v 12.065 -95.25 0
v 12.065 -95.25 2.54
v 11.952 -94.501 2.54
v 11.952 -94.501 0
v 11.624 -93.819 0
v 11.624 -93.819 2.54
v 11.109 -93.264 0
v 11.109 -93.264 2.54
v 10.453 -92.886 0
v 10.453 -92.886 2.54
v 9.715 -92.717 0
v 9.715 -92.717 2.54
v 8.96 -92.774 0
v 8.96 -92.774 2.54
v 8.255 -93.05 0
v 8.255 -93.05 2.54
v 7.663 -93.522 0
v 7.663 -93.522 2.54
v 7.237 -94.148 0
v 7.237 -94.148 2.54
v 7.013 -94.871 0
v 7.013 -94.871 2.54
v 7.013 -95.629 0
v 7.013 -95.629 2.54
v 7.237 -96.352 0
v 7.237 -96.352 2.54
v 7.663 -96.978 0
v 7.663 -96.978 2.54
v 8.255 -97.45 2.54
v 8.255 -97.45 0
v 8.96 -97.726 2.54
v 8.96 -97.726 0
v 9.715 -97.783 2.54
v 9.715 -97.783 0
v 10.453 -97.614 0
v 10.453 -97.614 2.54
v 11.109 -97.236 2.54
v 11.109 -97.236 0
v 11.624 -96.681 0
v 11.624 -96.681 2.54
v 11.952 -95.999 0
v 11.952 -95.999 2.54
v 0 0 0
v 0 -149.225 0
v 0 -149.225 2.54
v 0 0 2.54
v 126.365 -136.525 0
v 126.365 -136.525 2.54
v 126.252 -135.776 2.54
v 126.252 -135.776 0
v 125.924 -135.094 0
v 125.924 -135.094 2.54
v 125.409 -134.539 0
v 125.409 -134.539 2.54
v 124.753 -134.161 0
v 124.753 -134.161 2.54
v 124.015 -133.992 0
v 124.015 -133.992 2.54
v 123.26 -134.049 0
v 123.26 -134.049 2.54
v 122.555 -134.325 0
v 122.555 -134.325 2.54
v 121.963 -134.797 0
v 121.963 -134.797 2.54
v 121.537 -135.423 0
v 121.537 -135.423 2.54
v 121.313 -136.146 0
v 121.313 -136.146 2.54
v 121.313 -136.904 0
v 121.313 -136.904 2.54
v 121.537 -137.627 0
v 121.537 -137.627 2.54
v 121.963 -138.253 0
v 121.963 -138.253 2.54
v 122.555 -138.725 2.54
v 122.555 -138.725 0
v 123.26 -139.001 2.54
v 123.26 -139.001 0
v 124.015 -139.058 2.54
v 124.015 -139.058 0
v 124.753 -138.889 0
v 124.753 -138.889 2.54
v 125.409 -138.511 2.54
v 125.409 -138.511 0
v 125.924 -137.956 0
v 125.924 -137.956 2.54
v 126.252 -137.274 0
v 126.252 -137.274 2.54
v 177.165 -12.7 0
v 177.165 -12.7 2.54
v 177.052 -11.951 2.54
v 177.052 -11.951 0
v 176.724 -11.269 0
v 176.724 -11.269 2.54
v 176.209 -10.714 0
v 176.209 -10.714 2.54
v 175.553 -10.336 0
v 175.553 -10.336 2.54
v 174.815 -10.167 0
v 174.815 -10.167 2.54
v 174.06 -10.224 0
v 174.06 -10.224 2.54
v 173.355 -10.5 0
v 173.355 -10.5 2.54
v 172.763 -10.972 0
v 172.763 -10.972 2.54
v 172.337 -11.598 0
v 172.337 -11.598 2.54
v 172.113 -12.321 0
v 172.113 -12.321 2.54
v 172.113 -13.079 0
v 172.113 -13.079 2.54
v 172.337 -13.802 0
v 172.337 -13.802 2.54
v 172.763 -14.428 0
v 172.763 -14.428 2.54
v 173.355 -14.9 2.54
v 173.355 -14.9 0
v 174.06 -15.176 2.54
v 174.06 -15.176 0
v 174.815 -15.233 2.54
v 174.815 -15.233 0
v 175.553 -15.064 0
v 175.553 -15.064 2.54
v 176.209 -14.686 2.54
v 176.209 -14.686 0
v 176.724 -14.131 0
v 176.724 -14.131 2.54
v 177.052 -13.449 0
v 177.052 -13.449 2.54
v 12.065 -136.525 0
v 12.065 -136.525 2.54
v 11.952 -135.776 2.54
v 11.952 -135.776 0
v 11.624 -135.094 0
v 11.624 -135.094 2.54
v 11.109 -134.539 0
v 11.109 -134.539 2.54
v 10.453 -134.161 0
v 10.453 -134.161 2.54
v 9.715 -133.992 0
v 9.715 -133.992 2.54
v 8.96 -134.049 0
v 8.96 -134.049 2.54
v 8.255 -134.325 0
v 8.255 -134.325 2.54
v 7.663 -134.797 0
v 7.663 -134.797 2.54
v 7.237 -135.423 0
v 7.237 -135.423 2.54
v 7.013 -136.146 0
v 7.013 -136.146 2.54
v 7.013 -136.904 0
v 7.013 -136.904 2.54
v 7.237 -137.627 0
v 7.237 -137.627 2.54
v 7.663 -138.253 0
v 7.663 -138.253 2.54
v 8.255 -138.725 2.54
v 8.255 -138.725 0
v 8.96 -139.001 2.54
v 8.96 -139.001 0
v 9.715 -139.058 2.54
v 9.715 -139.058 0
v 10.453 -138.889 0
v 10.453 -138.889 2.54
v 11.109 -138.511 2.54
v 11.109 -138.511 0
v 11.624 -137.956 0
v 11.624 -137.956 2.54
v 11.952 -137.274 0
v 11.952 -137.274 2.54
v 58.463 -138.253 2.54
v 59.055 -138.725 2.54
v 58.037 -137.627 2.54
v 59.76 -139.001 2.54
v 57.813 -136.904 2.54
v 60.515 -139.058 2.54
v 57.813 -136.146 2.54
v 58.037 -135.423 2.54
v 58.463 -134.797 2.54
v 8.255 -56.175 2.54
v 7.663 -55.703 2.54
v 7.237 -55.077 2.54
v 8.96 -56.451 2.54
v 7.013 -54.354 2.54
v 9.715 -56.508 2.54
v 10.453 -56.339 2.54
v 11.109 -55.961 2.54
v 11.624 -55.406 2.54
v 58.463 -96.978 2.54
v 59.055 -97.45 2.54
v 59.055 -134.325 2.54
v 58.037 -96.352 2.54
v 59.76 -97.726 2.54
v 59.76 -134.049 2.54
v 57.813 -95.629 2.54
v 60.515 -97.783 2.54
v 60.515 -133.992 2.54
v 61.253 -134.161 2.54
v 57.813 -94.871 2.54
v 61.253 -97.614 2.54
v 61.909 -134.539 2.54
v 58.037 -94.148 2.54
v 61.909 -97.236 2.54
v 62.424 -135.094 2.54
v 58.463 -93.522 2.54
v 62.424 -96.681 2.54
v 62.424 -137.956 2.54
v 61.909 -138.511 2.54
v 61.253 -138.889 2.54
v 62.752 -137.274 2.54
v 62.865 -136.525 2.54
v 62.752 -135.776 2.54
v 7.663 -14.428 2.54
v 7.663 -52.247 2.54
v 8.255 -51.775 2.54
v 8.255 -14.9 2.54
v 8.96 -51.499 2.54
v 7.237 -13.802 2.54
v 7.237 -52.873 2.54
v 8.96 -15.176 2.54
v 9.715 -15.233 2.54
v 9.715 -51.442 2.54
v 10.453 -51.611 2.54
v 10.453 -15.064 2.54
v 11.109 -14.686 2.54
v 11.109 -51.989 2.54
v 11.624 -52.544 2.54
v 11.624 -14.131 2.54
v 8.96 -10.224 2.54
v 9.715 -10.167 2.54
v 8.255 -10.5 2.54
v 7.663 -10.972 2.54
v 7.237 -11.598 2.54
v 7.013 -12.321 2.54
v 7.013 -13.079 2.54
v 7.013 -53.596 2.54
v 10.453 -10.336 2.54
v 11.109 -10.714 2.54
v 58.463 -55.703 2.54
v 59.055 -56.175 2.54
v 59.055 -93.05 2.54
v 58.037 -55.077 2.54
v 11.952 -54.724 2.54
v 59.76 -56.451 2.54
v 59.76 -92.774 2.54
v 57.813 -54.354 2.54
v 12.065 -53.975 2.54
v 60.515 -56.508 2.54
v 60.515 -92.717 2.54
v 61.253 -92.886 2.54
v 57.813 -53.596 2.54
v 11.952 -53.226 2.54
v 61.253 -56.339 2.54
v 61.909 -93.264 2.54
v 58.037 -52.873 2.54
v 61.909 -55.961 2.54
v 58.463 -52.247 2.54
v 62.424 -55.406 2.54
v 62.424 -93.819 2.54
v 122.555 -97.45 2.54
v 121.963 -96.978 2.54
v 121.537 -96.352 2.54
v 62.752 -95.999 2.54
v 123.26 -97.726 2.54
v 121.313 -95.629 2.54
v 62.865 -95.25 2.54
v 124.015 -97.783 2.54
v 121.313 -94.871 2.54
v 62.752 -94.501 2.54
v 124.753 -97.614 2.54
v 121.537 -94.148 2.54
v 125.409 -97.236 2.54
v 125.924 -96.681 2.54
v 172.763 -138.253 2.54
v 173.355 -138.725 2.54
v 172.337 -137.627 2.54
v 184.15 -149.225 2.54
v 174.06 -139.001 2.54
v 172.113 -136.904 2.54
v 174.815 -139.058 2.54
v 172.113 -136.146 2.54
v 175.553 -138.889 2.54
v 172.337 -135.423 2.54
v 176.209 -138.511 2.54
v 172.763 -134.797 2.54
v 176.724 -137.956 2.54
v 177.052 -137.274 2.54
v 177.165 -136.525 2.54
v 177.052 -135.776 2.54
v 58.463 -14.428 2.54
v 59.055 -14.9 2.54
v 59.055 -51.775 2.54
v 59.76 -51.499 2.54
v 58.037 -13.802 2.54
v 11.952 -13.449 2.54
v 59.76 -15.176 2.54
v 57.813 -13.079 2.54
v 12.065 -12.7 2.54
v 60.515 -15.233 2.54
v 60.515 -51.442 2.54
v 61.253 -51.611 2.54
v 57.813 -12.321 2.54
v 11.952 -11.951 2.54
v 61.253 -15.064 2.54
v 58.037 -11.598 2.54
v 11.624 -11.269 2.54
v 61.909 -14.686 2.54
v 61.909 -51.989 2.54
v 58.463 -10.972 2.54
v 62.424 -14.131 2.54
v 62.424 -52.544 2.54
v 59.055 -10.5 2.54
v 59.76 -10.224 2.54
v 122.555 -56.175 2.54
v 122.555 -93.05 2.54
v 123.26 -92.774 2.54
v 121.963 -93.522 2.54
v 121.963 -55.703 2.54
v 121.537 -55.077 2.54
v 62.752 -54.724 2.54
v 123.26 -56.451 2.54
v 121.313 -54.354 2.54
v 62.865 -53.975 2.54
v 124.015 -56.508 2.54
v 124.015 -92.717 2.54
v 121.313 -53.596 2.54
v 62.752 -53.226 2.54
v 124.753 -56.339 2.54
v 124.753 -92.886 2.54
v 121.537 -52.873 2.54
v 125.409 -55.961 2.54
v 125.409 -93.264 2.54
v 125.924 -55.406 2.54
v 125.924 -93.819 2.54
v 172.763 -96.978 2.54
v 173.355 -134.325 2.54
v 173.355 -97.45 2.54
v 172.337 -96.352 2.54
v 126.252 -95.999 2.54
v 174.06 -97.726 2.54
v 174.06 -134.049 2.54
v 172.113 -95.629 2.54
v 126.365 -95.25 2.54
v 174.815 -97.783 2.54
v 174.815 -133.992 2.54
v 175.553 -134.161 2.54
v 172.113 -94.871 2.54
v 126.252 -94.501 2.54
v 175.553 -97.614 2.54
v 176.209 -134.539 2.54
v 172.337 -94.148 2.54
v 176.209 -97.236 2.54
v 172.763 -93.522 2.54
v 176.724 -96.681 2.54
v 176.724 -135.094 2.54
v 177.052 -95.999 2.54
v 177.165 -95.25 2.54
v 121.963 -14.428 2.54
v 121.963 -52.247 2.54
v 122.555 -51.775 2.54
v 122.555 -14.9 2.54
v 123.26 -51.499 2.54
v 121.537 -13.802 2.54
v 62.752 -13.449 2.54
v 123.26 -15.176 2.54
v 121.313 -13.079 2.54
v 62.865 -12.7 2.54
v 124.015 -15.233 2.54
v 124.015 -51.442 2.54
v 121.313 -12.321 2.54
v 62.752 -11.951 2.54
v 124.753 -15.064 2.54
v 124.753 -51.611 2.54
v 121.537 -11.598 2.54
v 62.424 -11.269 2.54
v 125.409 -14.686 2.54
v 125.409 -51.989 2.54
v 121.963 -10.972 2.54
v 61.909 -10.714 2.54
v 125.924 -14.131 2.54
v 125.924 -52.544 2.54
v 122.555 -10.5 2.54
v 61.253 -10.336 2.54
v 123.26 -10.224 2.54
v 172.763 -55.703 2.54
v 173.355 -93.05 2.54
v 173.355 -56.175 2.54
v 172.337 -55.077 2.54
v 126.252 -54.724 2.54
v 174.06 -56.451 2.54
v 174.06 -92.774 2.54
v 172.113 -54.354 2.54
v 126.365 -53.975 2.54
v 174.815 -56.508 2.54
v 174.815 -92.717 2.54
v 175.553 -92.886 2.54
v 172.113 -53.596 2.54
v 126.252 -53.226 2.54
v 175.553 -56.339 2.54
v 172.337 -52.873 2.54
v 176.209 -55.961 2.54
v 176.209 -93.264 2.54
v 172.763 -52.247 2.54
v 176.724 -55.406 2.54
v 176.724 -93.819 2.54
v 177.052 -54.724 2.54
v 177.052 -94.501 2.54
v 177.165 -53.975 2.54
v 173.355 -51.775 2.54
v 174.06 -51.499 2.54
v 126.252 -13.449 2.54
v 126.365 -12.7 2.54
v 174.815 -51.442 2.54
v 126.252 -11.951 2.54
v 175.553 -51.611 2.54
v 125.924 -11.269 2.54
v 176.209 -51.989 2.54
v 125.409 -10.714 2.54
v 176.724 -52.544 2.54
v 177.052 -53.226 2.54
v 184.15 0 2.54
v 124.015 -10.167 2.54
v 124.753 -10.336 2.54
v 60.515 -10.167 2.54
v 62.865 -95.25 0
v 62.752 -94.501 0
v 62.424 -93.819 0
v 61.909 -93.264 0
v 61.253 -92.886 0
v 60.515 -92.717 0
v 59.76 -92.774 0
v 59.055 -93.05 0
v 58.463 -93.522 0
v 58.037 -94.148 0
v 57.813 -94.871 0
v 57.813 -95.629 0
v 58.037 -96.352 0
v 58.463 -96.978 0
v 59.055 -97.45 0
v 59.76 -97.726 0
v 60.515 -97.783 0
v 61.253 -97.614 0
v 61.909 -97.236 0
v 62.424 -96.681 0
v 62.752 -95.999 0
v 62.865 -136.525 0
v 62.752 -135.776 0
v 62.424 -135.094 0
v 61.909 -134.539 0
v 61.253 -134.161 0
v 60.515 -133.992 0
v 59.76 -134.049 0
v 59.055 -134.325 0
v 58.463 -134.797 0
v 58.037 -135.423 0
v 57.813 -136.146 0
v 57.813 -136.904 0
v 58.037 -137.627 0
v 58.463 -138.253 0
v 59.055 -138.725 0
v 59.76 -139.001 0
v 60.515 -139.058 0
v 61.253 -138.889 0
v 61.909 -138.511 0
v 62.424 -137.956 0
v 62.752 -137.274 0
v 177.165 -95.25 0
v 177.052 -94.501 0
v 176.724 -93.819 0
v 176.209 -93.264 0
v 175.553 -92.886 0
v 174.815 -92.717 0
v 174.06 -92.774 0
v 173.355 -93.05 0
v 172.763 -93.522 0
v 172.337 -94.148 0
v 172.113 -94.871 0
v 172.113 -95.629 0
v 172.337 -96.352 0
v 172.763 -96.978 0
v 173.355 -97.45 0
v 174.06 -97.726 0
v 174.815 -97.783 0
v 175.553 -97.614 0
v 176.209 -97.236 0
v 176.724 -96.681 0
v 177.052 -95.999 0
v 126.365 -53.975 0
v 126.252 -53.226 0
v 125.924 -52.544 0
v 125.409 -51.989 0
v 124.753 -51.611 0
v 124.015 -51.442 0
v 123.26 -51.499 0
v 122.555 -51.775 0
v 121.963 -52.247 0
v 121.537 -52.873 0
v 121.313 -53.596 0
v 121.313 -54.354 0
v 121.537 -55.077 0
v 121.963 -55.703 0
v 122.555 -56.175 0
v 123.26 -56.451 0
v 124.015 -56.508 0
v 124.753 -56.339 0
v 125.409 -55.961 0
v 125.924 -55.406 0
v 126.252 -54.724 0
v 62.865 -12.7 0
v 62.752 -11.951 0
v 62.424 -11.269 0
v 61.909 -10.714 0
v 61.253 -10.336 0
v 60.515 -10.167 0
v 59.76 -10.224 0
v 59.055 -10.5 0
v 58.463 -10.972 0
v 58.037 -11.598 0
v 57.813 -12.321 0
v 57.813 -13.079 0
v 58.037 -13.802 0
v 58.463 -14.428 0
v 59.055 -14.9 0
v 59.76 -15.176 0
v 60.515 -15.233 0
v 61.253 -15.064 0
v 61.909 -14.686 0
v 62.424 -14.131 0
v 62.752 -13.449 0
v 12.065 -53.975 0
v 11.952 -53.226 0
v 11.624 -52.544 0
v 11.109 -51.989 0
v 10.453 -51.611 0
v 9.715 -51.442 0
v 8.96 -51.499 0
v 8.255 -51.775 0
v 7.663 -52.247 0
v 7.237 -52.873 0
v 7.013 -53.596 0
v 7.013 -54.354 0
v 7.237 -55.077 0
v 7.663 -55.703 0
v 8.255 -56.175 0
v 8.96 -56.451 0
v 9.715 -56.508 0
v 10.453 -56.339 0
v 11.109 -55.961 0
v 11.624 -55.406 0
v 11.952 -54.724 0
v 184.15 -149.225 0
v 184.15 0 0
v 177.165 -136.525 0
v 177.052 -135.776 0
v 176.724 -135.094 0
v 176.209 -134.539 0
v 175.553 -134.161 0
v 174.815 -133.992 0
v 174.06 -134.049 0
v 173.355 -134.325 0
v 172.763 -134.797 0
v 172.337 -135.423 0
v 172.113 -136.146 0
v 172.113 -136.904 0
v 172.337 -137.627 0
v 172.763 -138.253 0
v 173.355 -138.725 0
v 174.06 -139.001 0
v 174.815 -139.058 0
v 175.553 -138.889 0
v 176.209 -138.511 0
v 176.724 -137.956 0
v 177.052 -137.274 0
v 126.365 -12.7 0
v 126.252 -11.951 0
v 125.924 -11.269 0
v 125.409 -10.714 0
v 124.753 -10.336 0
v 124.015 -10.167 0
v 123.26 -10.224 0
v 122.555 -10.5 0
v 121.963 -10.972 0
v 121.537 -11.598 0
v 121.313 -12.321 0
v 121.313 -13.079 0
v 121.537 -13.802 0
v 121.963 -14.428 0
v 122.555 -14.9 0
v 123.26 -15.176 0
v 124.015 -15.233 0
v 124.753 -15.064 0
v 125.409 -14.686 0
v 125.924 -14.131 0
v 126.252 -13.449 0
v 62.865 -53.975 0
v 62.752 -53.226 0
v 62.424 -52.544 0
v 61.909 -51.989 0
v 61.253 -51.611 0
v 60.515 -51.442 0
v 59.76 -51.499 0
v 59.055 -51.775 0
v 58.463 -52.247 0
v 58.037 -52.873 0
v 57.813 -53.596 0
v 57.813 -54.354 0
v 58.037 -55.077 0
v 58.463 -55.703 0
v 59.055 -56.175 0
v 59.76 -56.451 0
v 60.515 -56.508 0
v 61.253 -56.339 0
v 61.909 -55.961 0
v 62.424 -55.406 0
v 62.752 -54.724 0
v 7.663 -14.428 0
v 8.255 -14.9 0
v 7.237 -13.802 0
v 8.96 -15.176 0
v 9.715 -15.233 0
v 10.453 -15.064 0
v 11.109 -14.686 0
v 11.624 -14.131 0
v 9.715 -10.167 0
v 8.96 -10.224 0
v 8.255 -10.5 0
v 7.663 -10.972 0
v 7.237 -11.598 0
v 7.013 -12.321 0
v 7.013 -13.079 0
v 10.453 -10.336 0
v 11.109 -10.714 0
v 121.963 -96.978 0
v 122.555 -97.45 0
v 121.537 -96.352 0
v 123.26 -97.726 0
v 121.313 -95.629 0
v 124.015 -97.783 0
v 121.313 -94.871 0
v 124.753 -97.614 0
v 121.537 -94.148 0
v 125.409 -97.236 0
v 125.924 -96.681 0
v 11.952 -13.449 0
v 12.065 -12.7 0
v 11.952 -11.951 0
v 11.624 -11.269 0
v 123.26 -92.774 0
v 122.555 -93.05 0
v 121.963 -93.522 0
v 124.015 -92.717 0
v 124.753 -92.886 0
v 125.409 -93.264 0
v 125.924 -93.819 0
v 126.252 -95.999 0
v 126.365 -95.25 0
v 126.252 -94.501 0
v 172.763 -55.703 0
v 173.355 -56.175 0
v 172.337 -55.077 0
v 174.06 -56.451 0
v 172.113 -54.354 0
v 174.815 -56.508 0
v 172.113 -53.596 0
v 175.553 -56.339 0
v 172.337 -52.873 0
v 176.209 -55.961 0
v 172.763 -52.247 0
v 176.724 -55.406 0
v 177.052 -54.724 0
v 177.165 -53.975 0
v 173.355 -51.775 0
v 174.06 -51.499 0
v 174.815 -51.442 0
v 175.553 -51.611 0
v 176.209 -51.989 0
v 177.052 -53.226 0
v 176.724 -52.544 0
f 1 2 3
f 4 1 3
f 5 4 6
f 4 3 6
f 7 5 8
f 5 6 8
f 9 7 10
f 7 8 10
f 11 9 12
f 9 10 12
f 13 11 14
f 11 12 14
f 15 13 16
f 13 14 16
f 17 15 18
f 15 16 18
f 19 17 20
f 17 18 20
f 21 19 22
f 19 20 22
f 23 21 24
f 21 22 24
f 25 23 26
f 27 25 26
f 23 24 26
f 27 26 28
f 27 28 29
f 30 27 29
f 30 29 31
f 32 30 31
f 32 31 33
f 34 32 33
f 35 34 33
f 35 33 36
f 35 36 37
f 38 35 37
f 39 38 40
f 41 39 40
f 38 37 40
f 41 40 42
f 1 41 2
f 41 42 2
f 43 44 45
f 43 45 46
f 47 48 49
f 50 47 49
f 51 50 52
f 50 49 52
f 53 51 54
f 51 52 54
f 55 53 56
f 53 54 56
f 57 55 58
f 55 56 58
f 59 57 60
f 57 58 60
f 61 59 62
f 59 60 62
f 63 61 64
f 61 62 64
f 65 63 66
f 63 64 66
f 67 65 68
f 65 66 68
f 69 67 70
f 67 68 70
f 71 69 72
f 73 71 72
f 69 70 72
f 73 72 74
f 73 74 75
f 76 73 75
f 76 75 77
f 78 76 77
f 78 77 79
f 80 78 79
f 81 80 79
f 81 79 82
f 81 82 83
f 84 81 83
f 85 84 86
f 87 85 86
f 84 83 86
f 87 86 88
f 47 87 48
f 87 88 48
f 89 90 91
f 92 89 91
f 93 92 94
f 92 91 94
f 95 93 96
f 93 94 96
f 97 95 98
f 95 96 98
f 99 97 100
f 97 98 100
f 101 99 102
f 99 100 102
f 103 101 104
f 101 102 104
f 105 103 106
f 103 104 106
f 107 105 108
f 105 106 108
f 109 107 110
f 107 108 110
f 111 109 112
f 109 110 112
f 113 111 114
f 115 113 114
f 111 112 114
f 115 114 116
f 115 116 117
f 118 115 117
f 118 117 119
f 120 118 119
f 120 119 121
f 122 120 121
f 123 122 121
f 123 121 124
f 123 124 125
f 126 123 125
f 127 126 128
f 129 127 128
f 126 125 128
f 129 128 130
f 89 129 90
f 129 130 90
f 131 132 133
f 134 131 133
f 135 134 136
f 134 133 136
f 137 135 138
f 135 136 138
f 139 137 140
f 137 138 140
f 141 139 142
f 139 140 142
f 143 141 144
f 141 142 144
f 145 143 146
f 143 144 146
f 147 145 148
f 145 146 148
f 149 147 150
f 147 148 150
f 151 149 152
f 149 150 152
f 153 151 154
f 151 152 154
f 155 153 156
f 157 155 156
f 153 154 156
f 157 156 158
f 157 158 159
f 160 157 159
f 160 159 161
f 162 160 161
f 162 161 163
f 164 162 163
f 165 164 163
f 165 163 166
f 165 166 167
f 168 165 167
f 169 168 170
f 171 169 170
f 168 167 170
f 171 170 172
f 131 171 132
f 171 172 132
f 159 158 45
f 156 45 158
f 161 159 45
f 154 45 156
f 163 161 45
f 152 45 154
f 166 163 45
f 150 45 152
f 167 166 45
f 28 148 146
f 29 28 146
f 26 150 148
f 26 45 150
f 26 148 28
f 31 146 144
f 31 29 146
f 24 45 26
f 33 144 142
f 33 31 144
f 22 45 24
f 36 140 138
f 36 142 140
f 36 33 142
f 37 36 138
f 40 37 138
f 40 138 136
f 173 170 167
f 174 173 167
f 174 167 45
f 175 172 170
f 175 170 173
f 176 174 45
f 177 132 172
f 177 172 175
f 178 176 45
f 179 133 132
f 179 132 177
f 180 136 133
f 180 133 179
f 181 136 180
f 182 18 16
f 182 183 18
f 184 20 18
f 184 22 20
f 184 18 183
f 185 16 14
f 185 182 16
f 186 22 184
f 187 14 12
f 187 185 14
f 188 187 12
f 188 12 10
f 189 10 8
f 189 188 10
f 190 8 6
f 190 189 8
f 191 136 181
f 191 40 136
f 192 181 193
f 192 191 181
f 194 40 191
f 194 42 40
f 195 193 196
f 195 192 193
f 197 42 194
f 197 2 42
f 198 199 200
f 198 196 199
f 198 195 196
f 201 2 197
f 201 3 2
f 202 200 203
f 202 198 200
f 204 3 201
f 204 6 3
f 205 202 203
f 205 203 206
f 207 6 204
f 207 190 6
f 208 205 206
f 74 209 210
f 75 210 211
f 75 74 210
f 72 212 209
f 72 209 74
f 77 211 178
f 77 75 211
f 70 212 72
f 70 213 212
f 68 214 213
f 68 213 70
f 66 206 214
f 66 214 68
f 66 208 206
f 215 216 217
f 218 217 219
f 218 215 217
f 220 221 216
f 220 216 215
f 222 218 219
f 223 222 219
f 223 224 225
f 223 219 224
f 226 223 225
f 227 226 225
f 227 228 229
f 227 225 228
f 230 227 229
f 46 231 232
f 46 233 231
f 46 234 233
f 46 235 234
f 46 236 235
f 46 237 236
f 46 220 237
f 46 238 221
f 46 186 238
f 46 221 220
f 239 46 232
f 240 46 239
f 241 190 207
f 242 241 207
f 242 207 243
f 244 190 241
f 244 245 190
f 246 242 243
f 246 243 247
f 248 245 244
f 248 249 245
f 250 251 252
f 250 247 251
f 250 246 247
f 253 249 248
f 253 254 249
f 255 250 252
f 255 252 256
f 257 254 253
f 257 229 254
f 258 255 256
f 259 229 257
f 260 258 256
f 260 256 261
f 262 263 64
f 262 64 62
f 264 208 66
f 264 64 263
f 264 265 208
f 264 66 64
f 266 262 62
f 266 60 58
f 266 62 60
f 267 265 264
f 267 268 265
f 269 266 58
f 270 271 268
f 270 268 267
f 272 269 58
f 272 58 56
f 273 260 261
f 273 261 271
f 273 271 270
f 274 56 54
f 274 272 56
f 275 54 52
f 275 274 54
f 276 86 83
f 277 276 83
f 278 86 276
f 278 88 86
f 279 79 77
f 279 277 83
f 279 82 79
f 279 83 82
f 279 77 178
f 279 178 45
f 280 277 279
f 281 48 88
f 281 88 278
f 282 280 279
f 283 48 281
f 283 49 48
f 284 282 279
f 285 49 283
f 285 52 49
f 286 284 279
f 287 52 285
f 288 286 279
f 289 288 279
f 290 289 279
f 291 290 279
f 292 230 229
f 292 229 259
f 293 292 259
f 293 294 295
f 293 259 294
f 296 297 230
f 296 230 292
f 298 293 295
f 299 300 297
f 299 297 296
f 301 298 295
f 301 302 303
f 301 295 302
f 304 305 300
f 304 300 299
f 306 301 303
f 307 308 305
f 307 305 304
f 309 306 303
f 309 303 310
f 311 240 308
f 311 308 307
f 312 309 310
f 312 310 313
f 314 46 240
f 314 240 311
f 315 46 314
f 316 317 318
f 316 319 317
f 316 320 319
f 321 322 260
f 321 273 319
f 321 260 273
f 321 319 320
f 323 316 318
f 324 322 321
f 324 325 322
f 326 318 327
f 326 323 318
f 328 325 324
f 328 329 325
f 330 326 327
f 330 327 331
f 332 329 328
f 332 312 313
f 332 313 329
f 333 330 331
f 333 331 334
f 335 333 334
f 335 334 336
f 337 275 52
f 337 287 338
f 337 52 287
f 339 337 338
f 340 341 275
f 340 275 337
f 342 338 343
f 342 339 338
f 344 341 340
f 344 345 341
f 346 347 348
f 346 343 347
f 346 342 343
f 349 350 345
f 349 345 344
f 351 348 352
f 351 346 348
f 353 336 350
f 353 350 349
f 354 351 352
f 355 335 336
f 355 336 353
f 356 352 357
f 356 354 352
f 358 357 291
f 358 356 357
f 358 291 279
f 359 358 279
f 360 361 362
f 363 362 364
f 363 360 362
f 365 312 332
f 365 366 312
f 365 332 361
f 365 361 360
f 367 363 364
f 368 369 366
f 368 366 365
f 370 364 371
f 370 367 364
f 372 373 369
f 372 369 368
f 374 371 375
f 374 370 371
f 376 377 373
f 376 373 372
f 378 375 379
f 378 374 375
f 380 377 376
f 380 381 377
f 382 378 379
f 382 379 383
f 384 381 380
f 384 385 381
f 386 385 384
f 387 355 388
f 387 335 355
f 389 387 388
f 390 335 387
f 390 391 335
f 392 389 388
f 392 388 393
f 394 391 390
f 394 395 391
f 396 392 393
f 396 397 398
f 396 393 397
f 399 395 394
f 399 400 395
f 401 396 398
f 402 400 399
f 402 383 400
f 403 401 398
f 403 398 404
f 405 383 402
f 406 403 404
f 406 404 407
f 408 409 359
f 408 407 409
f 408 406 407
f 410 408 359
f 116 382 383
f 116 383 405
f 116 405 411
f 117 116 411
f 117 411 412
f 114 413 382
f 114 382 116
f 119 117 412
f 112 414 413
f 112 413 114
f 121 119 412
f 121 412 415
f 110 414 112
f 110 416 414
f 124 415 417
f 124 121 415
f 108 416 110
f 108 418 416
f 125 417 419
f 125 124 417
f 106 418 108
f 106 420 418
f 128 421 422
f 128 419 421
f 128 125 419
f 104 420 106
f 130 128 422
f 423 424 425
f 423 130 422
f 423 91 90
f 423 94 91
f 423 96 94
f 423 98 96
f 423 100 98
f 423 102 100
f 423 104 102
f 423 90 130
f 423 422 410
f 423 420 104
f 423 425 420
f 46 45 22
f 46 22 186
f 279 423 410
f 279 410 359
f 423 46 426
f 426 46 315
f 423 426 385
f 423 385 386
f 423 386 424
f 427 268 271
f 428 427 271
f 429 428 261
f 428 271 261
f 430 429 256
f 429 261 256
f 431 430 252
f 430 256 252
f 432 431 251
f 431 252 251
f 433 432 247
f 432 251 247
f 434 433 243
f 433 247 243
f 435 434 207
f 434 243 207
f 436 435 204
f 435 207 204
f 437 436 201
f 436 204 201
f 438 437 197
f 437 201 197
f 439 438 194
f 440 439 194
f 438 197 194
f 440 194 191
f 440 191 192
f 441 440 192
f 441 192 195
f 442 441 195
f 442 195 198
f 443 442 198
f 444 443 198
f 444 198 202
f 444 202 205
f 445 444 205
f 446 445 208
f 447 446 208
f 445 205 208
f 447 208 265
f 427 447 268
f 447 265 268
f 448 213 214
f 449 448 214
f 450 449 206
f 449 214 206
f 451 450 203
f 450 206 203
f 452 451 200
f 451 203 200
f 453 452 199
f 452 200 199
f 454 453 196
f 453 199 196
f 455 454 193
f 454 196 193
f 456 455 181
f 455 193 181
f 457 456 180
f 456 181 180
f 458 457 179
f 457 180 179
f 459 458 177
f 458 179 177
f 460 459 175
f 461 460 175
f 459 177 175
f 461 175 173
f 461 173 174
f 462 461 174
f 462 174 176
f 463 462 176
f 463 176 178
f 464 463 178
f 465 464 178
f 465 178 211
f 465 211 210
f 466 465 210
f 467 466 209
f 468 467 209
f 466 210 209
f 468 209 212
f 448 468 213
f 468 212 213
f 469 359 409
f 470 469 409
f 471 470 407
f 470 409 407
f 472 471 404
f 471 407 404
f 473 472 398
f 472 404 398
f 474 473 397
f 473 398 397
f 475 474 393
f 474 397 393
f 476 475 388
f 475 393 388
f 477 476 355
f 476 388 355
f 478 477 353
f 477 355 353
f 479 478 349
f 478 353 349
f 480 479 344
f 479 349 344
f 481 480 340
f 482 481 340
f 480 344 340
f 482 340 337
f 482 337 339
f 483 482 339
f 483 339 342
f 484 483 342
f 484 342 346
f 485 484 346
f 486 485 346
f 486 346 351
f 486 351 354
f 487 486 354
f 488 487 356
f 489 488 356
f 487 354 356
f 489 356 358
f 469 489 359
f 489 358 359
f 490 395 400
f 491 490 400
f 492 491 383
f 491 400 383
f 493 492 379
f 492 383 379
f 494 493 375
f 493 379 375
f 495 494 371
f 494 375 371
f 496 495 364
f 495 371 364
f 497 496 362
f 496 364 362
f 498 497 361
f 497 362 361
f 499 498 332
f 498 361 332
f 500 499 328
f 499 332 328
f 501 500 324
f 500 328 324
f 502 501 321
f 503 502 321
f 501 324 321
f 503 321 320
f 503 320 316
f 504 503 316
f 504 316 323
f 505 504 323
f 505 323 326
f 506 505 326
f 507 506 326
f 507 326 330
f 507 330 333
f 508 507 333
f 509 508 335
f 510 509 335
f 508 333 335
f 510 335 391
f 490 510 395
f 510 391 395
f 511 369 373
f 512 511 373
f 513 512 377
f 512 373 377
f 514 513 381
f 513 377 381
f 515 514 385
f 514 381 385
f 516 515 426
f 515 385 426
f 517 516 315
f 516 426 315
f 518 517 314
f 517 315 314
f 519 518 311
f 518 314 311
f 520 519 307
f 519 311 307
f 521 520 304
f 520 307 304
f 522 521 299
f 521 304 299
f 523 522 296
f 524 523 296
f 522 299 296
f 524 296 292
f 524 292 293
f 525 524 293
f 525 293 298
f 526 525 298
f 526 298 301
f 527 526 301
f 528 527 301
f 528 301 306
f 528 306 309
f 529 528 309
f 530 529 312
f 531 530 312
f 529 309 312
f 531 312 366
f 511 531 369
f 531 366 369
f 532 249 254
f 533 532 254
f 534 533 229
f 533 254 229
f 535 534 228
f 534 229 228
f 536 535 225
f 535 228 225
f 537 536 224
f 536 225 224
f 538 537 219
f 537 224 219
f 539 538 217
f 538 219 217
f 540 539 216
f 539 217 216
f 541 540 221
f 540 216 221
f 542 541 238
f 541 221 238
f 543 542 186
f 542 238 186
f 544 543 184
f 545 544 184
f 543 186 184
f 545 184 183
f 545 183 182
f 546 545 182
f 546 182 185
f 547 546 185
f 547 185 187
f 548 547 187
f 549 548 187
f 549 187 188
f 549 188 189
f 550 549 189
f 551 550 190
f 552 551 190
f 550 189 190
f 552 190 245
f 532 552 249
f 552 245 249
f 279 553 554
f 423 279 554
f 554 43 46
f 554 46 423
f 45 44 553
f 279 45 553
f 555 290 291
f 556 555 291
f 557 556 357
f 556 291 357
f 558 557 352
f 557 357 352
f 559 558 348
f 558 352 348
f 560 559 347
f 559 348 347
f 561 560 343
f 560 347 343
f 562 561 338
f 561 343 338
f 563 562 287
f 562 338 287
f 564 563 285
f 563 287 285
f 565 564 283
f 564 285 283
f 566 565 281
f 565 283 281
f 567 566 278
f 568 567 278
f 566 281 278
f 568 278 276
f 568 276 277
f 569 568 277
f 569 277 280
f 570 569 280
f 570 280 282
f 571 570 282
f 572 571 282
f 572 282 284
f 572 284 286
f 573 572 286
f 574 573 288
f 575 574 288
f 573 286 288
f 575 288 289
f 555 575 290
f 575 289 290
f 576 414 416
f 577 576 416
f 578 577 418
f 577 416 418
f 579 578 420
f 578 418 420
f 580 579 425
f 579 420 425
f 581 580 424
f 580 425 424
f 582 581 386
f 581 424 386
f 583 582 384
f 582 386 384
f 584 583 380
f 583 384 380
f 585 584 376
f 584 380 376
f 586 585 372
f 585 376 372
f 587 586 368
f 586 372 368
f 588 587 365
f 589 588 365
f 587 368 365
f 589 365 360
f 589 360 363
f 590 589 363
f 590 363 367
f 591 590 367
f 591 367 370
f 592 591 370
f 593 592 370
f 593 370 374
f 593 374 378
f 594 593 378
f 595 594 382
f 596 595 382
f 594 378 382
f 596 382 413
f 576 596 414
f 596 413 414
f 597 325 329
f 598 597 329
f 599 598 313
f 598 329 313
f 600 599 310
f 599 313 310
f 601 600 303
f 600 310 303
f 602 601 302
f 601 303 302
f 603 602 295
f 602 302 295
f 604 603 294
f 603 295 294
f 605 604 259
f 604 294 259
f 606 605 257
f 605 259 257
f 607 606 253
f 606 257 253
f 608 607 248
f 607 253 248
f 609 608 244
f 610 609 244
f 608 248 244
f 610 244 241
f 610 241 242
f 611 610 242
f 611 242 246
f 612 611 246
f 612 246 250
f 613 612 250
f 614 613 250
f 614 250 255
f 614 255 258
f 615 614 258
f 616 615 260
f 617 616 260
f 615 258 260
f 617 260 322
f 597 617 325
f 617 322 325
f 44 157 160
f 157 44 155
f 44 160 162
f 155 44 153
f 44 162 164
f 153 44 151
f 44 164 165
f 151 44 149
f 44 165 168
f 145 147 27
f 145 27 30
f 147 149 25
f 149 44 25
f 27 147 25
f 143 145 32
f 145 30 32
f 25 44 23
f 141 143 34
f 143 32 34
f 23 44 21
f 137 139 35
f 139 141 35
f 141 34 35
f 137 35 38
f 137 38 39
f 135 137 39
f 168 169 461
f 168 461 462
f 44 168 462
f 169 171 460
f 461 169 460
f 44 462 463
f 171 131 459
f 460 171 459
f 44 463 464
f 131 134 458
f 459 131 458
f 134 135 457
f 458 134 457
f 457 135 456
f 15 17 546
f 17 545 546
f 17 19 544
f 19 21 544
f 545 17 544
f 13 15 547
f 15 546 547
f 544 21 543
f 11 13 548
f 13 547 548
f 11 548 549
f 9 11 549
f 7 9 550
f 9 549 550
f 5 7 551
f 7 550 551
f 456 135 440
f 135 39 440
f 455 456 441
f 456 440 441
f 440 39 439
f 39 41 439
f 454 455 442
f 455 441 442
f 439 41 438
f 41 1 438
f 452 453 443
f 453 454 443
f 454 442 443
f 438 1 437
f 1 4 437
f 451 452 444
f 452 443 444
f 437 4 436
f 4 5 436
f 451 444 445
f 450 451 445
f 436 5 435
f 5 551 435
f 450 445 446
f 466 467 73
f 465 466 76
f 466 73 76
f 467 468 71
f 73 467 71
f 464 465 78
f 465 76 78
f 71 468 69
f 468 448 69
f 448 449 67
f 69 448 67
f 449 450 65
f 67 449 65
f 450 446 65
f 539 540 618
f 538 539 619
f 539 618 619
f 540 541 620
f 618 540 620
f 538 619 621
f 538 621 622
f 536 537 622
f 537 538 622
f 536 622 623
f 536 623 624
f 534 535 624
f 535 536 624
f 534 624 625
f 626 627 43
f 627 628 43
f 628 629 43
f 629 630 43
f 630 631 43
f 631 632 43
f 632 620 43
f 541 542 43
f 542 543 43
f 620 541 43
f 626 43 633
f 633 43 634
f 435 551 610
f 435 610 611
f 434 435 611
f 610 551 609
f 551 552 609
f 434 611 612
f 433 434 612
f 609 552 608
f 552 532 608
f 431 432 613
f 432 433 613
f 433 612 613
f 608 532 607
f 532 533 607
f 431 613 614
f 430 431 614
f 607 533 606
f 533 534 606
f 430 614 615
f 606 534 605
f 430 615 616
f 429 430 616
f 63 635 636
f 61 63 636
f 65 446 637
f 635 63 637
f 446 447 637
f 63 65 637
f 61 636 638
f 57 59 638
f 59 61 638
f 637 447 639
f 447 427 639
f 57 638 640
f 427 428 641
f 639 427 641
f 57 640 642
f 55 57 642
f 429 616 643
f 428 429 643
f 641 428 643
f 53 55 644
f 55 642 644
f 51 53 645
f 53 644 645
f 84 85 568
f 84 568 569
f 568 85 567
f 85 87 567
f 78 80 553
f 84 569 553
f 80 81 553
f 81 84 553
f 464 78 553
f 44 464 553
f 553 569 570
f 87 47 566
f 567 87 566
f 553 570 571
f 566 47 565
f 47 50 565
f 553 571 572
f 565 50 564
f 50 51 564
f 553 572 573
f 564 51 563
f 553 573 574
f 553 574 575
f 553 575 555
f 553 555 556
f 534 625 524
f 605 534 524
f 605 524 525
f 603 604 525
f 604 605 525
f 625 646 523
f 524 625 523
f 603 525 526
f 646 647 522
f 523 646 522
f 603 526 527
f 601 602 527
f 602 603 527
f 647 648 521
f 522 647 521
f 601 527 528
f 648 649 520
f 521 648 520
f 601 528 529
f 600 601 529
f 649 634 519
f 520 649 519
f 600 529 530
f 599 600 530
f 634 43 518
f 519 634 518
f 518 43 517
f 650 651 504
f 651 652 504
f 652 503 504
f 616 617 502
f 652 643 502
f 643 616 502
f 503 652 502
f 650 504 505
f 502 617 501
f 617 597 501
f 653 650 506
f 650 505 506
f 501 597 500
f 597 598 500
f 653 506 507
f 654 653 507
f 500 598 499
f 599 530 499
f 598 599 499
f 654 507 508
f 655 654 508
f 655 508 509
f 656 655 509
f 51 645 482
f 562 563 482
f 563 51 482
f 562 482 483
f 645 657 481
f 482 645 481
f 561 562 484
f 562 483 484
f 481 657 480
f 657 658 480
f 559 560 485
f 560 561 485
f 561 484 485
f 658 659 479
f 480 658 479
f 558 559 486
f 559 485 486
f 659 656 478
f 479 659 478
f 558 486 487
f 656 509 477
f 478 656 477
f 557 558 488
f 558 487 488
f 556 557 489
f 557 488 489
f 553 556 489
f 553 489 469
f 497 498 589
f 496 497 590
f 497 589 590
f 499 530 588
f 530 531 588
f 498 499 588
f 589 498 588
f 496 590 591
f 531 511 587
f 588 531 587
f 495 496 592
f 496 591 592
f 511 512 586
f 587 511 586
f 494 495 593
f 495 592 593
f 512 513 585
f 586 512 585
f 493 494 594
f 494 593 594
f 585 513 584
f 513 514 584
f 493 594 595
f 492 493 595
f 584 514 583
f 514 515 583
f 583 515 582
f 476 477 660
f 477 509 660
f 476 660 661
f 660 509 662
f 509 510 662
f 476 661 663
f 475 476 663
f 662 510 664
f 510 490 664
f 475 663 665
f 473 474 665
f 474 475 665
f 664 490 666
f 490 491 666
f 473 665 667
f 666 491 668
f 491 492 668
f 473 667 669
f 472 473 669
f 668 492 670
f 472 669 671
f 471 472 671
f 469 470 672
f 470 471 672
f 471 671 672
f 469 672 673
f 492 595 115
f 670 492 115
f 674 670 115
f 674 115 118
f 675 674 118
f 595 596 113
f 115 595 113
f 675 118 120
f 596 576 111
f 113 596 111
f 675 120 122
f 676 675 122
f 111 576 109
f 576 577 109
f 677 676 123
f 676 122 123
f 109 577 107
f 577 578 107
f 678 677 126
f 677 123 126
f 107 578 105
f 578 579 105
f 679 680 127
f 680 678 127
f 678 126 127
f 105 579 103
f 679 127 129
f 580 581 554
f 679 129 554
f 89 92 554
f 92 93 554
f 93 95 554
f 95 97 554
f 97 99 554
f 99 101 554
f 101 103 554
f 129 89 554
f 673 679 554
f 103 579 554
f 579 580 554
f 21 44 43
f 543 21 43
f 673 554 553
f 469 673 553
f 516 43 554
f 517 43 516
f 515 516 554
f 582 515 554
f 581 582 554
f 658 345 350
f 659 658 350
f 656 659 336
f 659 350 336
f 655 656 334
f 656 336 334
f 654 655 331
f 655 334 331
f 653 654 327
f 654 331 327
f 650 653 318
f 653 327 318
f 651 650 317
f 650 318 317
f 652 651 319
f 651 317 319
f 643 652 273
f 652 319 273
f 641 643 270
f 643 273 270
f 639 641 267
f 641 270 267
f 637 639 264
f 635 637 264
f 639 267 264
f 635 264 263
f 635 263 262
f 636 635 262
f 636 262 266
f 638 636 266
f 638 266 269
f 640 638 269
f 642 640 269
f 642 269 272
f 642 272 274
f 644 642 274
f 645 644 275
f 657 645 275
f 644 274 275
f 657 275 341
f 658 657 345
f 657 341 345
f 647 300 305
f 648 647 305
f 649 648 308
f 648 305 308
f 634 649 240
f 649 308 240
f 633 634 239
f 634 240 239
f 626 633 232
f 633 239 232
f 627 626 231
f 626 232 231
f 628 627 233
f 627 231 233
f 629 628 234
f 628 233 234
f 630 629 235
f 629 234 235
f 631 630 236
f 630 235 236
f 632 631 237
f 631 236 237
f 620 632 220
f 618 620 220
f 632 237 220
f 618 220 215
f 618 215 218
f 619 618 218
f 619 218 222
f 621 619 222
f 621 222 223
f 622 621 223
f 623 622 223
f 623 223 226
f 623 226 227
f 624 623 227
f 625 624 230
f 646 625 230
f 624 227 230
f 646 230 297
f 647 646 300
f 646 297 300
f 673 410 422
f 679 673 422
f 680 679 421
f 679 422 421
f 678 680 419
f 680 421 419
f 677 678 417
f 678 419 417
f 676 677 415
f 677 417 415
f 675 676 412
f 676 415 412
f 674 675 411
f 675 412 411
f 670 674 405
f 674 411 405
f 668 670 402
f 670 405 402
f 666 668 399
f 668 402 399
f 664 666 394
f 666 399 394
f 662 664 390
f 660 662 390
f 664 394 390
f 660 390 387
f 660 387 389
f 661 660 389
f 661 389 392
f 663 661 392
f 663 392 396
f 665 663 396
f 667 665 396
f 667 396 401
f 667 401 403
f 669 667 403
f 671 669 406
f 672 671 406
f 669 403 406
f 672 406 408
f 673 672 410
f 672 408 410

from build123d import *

# Parameters (mm, degrees)
SKETCH1_W                 = 184.15
SKETCH1_H                 = 149.225
BOSS_EXTRUDE1_DEPTH       = 2.54
SKETCH2_R                 = 2.54
CUT_EXTRUDE1_DEPTH        = 2.54
LPATTERN1_COUNT           = 2
LPATTERN1_PITCH           = 50.8
LPATTERN2_COUNT           = 2
LPATTERN2_PITCH           = 41.275
LPATTERN2_COPY_1_SKETCH_R = 2.54
LPATTERN2_COPY_1_DEPTH    = 2.54
SKETCH3_R                 = 2.54
CUT_EXTRUDE2_DEPTH        = 2.54
LPATTERN3_COUNT           = 2
LPATTERN3_PITCH           = 50.8
LPATTERN4_COUNT           = 2
LPATTERN4_PITCH           = 41.275
LPATTERN4_COPY_1_SKETCH_R = 2.54
LPATTERN4_COPY_1_DEPTH    = 2.54
SKETCH5_R                 = 2.54
CUT_EXTRUDE4_DEPTH        = 2.54
LPATTERN7_COUNT           = 2
LPATTERN7_PITCH           = 41.275
LPATTERN8_COUNT           = 2
LPATTERN8_PITCH           = 50.8
LPATTERN8_COPY_1_SKETCH_R = 2.54
LPATTERN8_COPY_1_DEPTH    = 2.54
LPATTERN9_COUNT           = 2
LPATTERN9_PITCH           = 82.55
LPATTERN9_COPY_1_SKETCH_R = 2.54
LPATTERN9_COPY_1_DEPTH    = 2.54
LPATTERN9_COPY_2_SKETCH_R = 2.54
LPATTERN9_COPY_2_DEPTH    = 2.54
LPATTERN9_COPY_3_SKETCH_R = 2.54
LPATTERN9_COPY_3_DEPTH    = 2.54


with BuildPart() as part:
    # Sketch1 → Boss-Extrude1 (new body)
    with BuildSketch(Plane.XY):
        with Locations((92.075, -74.6125)):
            Rectangle(SKETCH1_W, SKETCH1_H)
    extrude(amount=BOSS_EXTRUDE1_DEPTH)

    # Sketch2 → Cut-Extrude1 (cut)
    with BuildSketch(Plane.XY.offset(2.54)):
        with Locations((9.525, -12.7)):
            Circle(SKETCH2_R)
    cut_extrude1 = extrude(amount=-CUT_EXTRUDE1_DEPTH, mode=Mode.SUBTRACT)

    # LPattern1: Cut-Extrude1 ×2
    with Locations(*[(i * LPATTERN1_PITCH, 0, 0) for i in range(1, LPATTERN1_COUNT)]):
        add(cut_extrude1, mode=Mode.SUBTRACT)

    # LPattern2: Cut-Extrude1 ×2
    with Locations(*[(0, -i * LPATTERN2_PITCH, 0) for i in range(1, LPATTERN2_COUNT)]):
        add(cut_extrude1, mode=Mode.SUBTRACT)

    # LPattern2 copy 1 sketch → LPattern2 copy 1 (cut)
    with BuildSketch(Plane(origin=(50.8, -41.275, 2.54), x_dir=(1, 0, 0), z_dir=(0, 0, 1))):
        with Locations((9.525, -12.7)):
            Circle(LPATTERN2_COPY_1_SKETCH_R)
    extrude(amount=-LPATTERN2_COPY_1_DEPTH, mode=Mode.SUBTRACT)

    # Sketch3 → Cut-Extrude2 (cut)
    with BuildSketch(Plane.XY.offset(2.54)):
        with Locations((123.825, -12.7)):
            Circle(SKETCH3_R)
    cut_extrude2 = extrude(amount=-CUT_EXTRUDE2_DEPTH, mode=Mode.SUBTRACT)

    # LPattern3: Cut-Extrude2 ×2
    with Locations(*[(i * LPATTERN3_PITCH, 0, 0) for i in range(1, LPATTERN3_COUNT)]):
        add(cut_extrude2, mode=Mode.SUBTRACT)

    # LPattern4: Cut-Extrude2 ×2
    with Locations(*[(0, -i * LPATTERN4_PITCH, 0) for i in range(1, LPATTERN4_COUNT)]):
        add(cut_extrude2, mode=Mode.SUBTRACT)

    # LPattern4 copy 1 sketch → LPattern4 copy 1 (cut)
    with BuildSketch(Plane(origin=(50.8, -41.275, 2.54), x_dir=(1, 0, 0), z_dir=(0, 0, 1))):
        with Locations((123.825, -12.7)):
            Circle(LPATTERN4_COPY_1_SKETCH_R)
    extrude(amount=-LPATTERN4_COPY_1_DEPTH, mode=Mode.SUBTRACT)

    # Sketch5 → Cut-Extrude4 (cut)
    with BuildSketch(Plane.XY.offset(2.54)):
        with Locations((9.525, -136.525)):
            Circle(SKETCH5_R)
    cut_extrude4 = extrude(amount=-CUT_EXTRUDE4_DEPTH, mode=Mode.SUBTRACT)

    # LPattern7: Cut-Extrude4 ×2
    with Locations(*[(0, i * LPATTERN7_PITCH, 0) for i in range(1, LPATTERN7_COUNT)]):
        add(cut_extrude4, mode=Mode.SUBTRACT)

    # LPattern8: Cut-Extrude4 ×2
    with Locations(*[(i * LPATTERN8_PITCH, 0, 0) for i in range(1, LPATTERN8_COUNT)]):
        add(cut_extrude4, mode=Mode.SUBTRACT)

    # LPattern8 copy 1 sketch → LPattern8 copy 1 (cut)
    with BuildSketch(Plane(origin=(50.8, 41.275, 2.54), x_dir=(1, 0, 0), z_dir=(0, 0, 1))):
        with Locations((9.525, -136.525)):
            Circle(LPATTERN8_COPY_1_SKETCH_R)
    extrude(amount=-LPATTERN8_COPY_1_DEPTH, mode=Mode.SUBTRACT)

    # LPattern9: Cut-Extrude2 ×2
    with Locations(*[(0, -i * LPATTERN9_PITCH, 0) for i in range(1, LPATTERN9_COUNT)]):
        add(cut_extrude2, mode=Mode.SUBTRACT)

    # LPattern9 copy 1 sketch → LPattern9 copy 1 (cut)
    with BuildSketch(Plane(origin=(50.8, -82.55, 2.54), x_dir=(1, 0, 0), z_dir=(0, 0, 1))):
        with Locations((123.825, -12.7)):
            Circle(LPATTERN9_COPY_1_SKETCH_R)
    extrude(amount=-LPATTERN9_COPY_1_DEPTH, mode=Mode.SUBTRACT)

    # LPattern9 copy 2 sketch → LPattern9 copy 2 (cut)
    with BuildSketch(Plane(origin=(0, -123.825, 2.54), x_dir=(1, 0, 0), z_dir=(0, 0, 1))):
        with Locations((123.825, -12.7)):
            Circle(LPATTERN9_COPY_2_SKETCH_R)
    extrude(amount=-LPATTERN9_COPY_2_DEPTH, mode=Mode.SUBTRACT)

    # LPattern9 copy 3 sketch → LPattern9 copy 3 (cut)
    with BuildSketch(Plane(origin=(50.8, -123.825, 2.54), x_dir=(1, 0, 0), z_dir=(0, 0, 1))):
        with Locations((123.825, -12.7)):
            Circle(LPATTERN9_COPY_3_SKETCH_R)
    extrude(amount=-LPATTERN9_COPY_3_DEPTH, mode=Mode.SUBTRACT)


solid = part.part
